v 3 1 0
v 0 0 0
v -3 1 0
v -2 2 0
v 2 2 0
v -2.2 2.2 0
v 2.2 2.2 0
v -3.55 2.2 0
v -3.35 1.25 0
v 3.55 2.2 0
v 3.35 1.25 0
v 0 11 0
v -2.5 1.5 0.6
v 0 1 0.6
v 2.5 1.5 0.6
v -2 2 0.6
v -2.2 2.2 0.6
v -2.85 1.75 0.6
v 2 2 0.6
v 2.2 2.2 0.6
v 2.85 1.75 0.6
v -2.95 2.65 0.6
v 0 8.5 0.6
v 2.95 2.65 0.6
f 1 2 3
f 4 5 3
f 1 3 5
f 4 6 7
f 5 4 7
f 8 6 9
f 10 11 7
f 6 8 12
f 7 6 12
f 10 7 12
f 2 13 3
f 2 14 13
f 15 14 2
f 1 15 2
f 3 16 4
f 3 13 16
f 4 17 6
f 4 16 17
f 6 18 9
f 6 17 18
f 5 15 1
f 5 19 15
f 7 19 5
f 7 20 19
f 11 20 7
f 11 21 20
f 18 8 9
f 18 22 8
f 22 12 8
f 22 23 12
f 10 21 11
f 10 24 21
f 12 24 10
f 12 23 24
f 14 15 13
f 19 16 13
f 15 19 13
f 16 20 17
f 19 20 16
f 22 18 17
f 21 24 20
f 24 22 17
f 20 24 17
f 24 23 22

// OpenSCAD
length = 11; //[8:100]
width = 8; //[5:60]
height = 6; //[1:30]

polyhedron(
points=[
//~-~!!BOTTOM!!~-~
//curve
[1-width/2,1,0], //0
[0,0,0], //1
[width/2-1,1,0], //2
//left notch
[2-width/2,2,0], //3
[1.8-width/2,2.2,0], //4
[0.65-width/2,1.25,0], //5
[0.45-width/2,2.2,0], //6
//right notch
[width/2-2,2,0], //7
[width/2-1.8,2.2,0], //8
[width/2-0.65,1.25,0], //9
[width/2-0.45,2.2,0], //10
//point
[0,length,0], //11
//~-~!!TOP!!~-~
//curve
[1.5-width/2,1.5,height/10], //12
[0,1,height/10], //13
[width/2-1.5,1.5,height/10], //14
//left notch
[2-width/2,2,height/10], //15
[1.8-width/2,2.2,height/10], //16
[1.15-width/2,1.75,height/10], //17
[1.05-width/2,2.65,height/10], //18
//right notch
[width/2-2,2,height/10], //19
[width/2-1.8,2.2,height/10], //20
[width/2-1.15,1.75,height/10], //21
[width/2-1.05,2.65,height/10], //22
//point
[0,length-2.5,height/10] //23
],
triangles=[
//~-~!!BOTTOM!!~-~
//base
[0,1,2],
//inside notches
[0,7,3],
[7,0,2],
//above notches
[8,4,3],
[8,3,7],
//outside notches
[5,4,6], //left
[8,9,10], //right
//point
[11,6,4],
[11,4,8],
[11,8,10],
//~-~!!WALLS!!~-~
//!!base!!
//left
[0,12,1],
[12,13,1],
//right
[1,13,14],
[1,14,2],
//!~!notches!~!
//!!left!!
//inside
[3,15,0],
[15,12,0],
//middle
[4,16,3],
[16,15,3],
//outside
[5,17,4],
[17,16,4],
//!!right!!
//inside
[2,14,7],
[14,19,7],
//middle
[7,19,8],
[19,20,8],
//outside
[8,20,9],
[20,21,9],
//!~!outside top!~!
//!!left!!
//bottom
[5,6,17],
[6,18,17],
//point
[6,11,18],
[11,23,18],
//!!right!!
//bottom
[9,21,10],
[21,22,10],
//point
[10,22,11],
[22,23,11],
//~-~!!TOP!!~-~
//base
[12,14,13],
//inside notches
[12,15,19],
[12,19,14],
//above notches
[16,20,15],
[15,20,19],
//outside notches
[16,17,18], //left
[20,22,21], //right
//above all that
[16,18,22],
[16,22,20],
//point
[18,23,22]
]
);
